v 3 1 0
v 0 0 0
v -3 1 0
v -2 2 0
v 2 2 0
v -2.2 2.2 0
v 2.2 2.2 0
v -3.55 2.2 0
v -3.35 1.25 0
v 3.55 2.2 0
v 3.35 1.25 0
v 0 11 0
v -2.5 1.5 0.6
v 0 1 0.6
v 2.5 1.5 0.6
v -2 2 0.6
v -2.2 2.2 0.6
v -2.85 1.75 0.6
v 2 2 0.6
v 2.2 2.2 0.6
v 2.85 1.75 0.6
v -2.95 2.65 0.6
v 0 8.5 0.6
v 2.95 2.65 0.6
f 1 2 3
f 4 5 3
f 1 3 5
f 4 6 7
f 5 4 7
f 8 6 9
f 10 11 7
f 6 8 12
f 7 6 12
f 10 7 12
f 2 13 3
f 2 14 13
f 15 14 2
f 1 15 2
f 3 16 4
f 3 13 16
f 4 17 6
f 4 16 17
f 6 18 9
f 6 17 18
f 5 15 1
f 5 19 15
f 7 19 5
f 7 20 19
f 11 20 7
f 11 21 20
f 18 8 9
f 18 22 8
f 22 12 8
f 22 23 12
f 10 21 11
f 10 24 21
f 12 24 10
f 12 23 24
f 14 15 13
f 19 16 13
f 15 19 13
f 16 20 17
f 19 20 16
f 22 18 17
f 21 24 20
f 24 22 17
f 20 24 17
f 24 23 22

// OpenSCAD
length = 11; //[8:100]
width = 8; //[5:60]
height = 6; //[1:30]

polyhedron(
points=[
//~-~!!BOTTOM!!~-~
//curve
[1-width/2,1,0], //0
[0,0,0], //1
[width/2-1,1,0], //2
//left notch
[2-width/2,2,0], //3
[1.8-width/2,2.2,0], //4
[0.65-width/2,1.25,0], //5
[0.45-width/2,2.2,0], //6
//right notch
[width/2-2,2,0], //7
[width/2-1.8,2.2,0], //8
[width/2-0.65,1.25,0], //9
[width/2-0.45,2.2,0], //10
//point
[0,length,0], //11
//~-~!!TOP!!~-~
//curve
[1.5-width/2,1.5,height/10], //12
[0,1,height/10], //13
[width/2-1.5,1.5,height/10], //14
//left notch
[2-width/2,2,height/10], //15
[1.8-width/2,2.2,height/10], //16
[1.15-width/2,1.75,height/10], //17
[1.05-width/2,2.65,height/10], //18
//right notch
[width/2-2,2,height/10], //19
[width/2-1.8,2.2,height/10], //20
[width/2-1.15,1.75,height/10], //21
[width/2-1.05,2.65,height/10], //22
//point
[0,length-2.5,height/10] //23
],
triangles=[
//~-~!!BOTTOM!!~-~
//base
[0,1,2],
//inside notches
[0,7,3],
[7,0,2],
//above notches
[8,4,3],
[8,3,7],
//outside notches
[5,4,6], //left
[8,9,10], //right
//point
[11,6,4],
[11,4,8],
[11,8,10],
//~-~!!WALLS!!~-~
//!!base!!
//left
[0,12,1],
[12,13,1],
//right
[1,13,14],
[1,14,2],
//!~!notches!~!
//!!left!!
//inside
[3,15,0],
[15,12,0],
//middle
[4,16,3],
[16,15,3],
//outside
[5,17,4],
[17,16,4],
//!!right!!
//inside
[2,14,7],
[14,19,7],
//middle
[7,19,8],
[19,20,8],
//outside
[8,20,9],
[20,21,9],
//!~!outside top!~!
//!!left!!
//bottom
[5,6,17],
[6,18,17],
//point
[6,11,18],
[11,23,18],
//!!right!!
//bottom
[9,21,10],
[21,22,10],
//point
[10,22,11],
[22,23,11],
//~-~!!TOP!!~-~
//base
[12,14,13],
//inside notches
[12,15,19],
[12,19,14],
//above notches
[16,20,15],
[15,20,19],
//outside notches
[16,17,18], //left
[20,22,21], //right
//above all that
[16,18,22],
[16,22,20],
//point
[18,23,22]
]
);
